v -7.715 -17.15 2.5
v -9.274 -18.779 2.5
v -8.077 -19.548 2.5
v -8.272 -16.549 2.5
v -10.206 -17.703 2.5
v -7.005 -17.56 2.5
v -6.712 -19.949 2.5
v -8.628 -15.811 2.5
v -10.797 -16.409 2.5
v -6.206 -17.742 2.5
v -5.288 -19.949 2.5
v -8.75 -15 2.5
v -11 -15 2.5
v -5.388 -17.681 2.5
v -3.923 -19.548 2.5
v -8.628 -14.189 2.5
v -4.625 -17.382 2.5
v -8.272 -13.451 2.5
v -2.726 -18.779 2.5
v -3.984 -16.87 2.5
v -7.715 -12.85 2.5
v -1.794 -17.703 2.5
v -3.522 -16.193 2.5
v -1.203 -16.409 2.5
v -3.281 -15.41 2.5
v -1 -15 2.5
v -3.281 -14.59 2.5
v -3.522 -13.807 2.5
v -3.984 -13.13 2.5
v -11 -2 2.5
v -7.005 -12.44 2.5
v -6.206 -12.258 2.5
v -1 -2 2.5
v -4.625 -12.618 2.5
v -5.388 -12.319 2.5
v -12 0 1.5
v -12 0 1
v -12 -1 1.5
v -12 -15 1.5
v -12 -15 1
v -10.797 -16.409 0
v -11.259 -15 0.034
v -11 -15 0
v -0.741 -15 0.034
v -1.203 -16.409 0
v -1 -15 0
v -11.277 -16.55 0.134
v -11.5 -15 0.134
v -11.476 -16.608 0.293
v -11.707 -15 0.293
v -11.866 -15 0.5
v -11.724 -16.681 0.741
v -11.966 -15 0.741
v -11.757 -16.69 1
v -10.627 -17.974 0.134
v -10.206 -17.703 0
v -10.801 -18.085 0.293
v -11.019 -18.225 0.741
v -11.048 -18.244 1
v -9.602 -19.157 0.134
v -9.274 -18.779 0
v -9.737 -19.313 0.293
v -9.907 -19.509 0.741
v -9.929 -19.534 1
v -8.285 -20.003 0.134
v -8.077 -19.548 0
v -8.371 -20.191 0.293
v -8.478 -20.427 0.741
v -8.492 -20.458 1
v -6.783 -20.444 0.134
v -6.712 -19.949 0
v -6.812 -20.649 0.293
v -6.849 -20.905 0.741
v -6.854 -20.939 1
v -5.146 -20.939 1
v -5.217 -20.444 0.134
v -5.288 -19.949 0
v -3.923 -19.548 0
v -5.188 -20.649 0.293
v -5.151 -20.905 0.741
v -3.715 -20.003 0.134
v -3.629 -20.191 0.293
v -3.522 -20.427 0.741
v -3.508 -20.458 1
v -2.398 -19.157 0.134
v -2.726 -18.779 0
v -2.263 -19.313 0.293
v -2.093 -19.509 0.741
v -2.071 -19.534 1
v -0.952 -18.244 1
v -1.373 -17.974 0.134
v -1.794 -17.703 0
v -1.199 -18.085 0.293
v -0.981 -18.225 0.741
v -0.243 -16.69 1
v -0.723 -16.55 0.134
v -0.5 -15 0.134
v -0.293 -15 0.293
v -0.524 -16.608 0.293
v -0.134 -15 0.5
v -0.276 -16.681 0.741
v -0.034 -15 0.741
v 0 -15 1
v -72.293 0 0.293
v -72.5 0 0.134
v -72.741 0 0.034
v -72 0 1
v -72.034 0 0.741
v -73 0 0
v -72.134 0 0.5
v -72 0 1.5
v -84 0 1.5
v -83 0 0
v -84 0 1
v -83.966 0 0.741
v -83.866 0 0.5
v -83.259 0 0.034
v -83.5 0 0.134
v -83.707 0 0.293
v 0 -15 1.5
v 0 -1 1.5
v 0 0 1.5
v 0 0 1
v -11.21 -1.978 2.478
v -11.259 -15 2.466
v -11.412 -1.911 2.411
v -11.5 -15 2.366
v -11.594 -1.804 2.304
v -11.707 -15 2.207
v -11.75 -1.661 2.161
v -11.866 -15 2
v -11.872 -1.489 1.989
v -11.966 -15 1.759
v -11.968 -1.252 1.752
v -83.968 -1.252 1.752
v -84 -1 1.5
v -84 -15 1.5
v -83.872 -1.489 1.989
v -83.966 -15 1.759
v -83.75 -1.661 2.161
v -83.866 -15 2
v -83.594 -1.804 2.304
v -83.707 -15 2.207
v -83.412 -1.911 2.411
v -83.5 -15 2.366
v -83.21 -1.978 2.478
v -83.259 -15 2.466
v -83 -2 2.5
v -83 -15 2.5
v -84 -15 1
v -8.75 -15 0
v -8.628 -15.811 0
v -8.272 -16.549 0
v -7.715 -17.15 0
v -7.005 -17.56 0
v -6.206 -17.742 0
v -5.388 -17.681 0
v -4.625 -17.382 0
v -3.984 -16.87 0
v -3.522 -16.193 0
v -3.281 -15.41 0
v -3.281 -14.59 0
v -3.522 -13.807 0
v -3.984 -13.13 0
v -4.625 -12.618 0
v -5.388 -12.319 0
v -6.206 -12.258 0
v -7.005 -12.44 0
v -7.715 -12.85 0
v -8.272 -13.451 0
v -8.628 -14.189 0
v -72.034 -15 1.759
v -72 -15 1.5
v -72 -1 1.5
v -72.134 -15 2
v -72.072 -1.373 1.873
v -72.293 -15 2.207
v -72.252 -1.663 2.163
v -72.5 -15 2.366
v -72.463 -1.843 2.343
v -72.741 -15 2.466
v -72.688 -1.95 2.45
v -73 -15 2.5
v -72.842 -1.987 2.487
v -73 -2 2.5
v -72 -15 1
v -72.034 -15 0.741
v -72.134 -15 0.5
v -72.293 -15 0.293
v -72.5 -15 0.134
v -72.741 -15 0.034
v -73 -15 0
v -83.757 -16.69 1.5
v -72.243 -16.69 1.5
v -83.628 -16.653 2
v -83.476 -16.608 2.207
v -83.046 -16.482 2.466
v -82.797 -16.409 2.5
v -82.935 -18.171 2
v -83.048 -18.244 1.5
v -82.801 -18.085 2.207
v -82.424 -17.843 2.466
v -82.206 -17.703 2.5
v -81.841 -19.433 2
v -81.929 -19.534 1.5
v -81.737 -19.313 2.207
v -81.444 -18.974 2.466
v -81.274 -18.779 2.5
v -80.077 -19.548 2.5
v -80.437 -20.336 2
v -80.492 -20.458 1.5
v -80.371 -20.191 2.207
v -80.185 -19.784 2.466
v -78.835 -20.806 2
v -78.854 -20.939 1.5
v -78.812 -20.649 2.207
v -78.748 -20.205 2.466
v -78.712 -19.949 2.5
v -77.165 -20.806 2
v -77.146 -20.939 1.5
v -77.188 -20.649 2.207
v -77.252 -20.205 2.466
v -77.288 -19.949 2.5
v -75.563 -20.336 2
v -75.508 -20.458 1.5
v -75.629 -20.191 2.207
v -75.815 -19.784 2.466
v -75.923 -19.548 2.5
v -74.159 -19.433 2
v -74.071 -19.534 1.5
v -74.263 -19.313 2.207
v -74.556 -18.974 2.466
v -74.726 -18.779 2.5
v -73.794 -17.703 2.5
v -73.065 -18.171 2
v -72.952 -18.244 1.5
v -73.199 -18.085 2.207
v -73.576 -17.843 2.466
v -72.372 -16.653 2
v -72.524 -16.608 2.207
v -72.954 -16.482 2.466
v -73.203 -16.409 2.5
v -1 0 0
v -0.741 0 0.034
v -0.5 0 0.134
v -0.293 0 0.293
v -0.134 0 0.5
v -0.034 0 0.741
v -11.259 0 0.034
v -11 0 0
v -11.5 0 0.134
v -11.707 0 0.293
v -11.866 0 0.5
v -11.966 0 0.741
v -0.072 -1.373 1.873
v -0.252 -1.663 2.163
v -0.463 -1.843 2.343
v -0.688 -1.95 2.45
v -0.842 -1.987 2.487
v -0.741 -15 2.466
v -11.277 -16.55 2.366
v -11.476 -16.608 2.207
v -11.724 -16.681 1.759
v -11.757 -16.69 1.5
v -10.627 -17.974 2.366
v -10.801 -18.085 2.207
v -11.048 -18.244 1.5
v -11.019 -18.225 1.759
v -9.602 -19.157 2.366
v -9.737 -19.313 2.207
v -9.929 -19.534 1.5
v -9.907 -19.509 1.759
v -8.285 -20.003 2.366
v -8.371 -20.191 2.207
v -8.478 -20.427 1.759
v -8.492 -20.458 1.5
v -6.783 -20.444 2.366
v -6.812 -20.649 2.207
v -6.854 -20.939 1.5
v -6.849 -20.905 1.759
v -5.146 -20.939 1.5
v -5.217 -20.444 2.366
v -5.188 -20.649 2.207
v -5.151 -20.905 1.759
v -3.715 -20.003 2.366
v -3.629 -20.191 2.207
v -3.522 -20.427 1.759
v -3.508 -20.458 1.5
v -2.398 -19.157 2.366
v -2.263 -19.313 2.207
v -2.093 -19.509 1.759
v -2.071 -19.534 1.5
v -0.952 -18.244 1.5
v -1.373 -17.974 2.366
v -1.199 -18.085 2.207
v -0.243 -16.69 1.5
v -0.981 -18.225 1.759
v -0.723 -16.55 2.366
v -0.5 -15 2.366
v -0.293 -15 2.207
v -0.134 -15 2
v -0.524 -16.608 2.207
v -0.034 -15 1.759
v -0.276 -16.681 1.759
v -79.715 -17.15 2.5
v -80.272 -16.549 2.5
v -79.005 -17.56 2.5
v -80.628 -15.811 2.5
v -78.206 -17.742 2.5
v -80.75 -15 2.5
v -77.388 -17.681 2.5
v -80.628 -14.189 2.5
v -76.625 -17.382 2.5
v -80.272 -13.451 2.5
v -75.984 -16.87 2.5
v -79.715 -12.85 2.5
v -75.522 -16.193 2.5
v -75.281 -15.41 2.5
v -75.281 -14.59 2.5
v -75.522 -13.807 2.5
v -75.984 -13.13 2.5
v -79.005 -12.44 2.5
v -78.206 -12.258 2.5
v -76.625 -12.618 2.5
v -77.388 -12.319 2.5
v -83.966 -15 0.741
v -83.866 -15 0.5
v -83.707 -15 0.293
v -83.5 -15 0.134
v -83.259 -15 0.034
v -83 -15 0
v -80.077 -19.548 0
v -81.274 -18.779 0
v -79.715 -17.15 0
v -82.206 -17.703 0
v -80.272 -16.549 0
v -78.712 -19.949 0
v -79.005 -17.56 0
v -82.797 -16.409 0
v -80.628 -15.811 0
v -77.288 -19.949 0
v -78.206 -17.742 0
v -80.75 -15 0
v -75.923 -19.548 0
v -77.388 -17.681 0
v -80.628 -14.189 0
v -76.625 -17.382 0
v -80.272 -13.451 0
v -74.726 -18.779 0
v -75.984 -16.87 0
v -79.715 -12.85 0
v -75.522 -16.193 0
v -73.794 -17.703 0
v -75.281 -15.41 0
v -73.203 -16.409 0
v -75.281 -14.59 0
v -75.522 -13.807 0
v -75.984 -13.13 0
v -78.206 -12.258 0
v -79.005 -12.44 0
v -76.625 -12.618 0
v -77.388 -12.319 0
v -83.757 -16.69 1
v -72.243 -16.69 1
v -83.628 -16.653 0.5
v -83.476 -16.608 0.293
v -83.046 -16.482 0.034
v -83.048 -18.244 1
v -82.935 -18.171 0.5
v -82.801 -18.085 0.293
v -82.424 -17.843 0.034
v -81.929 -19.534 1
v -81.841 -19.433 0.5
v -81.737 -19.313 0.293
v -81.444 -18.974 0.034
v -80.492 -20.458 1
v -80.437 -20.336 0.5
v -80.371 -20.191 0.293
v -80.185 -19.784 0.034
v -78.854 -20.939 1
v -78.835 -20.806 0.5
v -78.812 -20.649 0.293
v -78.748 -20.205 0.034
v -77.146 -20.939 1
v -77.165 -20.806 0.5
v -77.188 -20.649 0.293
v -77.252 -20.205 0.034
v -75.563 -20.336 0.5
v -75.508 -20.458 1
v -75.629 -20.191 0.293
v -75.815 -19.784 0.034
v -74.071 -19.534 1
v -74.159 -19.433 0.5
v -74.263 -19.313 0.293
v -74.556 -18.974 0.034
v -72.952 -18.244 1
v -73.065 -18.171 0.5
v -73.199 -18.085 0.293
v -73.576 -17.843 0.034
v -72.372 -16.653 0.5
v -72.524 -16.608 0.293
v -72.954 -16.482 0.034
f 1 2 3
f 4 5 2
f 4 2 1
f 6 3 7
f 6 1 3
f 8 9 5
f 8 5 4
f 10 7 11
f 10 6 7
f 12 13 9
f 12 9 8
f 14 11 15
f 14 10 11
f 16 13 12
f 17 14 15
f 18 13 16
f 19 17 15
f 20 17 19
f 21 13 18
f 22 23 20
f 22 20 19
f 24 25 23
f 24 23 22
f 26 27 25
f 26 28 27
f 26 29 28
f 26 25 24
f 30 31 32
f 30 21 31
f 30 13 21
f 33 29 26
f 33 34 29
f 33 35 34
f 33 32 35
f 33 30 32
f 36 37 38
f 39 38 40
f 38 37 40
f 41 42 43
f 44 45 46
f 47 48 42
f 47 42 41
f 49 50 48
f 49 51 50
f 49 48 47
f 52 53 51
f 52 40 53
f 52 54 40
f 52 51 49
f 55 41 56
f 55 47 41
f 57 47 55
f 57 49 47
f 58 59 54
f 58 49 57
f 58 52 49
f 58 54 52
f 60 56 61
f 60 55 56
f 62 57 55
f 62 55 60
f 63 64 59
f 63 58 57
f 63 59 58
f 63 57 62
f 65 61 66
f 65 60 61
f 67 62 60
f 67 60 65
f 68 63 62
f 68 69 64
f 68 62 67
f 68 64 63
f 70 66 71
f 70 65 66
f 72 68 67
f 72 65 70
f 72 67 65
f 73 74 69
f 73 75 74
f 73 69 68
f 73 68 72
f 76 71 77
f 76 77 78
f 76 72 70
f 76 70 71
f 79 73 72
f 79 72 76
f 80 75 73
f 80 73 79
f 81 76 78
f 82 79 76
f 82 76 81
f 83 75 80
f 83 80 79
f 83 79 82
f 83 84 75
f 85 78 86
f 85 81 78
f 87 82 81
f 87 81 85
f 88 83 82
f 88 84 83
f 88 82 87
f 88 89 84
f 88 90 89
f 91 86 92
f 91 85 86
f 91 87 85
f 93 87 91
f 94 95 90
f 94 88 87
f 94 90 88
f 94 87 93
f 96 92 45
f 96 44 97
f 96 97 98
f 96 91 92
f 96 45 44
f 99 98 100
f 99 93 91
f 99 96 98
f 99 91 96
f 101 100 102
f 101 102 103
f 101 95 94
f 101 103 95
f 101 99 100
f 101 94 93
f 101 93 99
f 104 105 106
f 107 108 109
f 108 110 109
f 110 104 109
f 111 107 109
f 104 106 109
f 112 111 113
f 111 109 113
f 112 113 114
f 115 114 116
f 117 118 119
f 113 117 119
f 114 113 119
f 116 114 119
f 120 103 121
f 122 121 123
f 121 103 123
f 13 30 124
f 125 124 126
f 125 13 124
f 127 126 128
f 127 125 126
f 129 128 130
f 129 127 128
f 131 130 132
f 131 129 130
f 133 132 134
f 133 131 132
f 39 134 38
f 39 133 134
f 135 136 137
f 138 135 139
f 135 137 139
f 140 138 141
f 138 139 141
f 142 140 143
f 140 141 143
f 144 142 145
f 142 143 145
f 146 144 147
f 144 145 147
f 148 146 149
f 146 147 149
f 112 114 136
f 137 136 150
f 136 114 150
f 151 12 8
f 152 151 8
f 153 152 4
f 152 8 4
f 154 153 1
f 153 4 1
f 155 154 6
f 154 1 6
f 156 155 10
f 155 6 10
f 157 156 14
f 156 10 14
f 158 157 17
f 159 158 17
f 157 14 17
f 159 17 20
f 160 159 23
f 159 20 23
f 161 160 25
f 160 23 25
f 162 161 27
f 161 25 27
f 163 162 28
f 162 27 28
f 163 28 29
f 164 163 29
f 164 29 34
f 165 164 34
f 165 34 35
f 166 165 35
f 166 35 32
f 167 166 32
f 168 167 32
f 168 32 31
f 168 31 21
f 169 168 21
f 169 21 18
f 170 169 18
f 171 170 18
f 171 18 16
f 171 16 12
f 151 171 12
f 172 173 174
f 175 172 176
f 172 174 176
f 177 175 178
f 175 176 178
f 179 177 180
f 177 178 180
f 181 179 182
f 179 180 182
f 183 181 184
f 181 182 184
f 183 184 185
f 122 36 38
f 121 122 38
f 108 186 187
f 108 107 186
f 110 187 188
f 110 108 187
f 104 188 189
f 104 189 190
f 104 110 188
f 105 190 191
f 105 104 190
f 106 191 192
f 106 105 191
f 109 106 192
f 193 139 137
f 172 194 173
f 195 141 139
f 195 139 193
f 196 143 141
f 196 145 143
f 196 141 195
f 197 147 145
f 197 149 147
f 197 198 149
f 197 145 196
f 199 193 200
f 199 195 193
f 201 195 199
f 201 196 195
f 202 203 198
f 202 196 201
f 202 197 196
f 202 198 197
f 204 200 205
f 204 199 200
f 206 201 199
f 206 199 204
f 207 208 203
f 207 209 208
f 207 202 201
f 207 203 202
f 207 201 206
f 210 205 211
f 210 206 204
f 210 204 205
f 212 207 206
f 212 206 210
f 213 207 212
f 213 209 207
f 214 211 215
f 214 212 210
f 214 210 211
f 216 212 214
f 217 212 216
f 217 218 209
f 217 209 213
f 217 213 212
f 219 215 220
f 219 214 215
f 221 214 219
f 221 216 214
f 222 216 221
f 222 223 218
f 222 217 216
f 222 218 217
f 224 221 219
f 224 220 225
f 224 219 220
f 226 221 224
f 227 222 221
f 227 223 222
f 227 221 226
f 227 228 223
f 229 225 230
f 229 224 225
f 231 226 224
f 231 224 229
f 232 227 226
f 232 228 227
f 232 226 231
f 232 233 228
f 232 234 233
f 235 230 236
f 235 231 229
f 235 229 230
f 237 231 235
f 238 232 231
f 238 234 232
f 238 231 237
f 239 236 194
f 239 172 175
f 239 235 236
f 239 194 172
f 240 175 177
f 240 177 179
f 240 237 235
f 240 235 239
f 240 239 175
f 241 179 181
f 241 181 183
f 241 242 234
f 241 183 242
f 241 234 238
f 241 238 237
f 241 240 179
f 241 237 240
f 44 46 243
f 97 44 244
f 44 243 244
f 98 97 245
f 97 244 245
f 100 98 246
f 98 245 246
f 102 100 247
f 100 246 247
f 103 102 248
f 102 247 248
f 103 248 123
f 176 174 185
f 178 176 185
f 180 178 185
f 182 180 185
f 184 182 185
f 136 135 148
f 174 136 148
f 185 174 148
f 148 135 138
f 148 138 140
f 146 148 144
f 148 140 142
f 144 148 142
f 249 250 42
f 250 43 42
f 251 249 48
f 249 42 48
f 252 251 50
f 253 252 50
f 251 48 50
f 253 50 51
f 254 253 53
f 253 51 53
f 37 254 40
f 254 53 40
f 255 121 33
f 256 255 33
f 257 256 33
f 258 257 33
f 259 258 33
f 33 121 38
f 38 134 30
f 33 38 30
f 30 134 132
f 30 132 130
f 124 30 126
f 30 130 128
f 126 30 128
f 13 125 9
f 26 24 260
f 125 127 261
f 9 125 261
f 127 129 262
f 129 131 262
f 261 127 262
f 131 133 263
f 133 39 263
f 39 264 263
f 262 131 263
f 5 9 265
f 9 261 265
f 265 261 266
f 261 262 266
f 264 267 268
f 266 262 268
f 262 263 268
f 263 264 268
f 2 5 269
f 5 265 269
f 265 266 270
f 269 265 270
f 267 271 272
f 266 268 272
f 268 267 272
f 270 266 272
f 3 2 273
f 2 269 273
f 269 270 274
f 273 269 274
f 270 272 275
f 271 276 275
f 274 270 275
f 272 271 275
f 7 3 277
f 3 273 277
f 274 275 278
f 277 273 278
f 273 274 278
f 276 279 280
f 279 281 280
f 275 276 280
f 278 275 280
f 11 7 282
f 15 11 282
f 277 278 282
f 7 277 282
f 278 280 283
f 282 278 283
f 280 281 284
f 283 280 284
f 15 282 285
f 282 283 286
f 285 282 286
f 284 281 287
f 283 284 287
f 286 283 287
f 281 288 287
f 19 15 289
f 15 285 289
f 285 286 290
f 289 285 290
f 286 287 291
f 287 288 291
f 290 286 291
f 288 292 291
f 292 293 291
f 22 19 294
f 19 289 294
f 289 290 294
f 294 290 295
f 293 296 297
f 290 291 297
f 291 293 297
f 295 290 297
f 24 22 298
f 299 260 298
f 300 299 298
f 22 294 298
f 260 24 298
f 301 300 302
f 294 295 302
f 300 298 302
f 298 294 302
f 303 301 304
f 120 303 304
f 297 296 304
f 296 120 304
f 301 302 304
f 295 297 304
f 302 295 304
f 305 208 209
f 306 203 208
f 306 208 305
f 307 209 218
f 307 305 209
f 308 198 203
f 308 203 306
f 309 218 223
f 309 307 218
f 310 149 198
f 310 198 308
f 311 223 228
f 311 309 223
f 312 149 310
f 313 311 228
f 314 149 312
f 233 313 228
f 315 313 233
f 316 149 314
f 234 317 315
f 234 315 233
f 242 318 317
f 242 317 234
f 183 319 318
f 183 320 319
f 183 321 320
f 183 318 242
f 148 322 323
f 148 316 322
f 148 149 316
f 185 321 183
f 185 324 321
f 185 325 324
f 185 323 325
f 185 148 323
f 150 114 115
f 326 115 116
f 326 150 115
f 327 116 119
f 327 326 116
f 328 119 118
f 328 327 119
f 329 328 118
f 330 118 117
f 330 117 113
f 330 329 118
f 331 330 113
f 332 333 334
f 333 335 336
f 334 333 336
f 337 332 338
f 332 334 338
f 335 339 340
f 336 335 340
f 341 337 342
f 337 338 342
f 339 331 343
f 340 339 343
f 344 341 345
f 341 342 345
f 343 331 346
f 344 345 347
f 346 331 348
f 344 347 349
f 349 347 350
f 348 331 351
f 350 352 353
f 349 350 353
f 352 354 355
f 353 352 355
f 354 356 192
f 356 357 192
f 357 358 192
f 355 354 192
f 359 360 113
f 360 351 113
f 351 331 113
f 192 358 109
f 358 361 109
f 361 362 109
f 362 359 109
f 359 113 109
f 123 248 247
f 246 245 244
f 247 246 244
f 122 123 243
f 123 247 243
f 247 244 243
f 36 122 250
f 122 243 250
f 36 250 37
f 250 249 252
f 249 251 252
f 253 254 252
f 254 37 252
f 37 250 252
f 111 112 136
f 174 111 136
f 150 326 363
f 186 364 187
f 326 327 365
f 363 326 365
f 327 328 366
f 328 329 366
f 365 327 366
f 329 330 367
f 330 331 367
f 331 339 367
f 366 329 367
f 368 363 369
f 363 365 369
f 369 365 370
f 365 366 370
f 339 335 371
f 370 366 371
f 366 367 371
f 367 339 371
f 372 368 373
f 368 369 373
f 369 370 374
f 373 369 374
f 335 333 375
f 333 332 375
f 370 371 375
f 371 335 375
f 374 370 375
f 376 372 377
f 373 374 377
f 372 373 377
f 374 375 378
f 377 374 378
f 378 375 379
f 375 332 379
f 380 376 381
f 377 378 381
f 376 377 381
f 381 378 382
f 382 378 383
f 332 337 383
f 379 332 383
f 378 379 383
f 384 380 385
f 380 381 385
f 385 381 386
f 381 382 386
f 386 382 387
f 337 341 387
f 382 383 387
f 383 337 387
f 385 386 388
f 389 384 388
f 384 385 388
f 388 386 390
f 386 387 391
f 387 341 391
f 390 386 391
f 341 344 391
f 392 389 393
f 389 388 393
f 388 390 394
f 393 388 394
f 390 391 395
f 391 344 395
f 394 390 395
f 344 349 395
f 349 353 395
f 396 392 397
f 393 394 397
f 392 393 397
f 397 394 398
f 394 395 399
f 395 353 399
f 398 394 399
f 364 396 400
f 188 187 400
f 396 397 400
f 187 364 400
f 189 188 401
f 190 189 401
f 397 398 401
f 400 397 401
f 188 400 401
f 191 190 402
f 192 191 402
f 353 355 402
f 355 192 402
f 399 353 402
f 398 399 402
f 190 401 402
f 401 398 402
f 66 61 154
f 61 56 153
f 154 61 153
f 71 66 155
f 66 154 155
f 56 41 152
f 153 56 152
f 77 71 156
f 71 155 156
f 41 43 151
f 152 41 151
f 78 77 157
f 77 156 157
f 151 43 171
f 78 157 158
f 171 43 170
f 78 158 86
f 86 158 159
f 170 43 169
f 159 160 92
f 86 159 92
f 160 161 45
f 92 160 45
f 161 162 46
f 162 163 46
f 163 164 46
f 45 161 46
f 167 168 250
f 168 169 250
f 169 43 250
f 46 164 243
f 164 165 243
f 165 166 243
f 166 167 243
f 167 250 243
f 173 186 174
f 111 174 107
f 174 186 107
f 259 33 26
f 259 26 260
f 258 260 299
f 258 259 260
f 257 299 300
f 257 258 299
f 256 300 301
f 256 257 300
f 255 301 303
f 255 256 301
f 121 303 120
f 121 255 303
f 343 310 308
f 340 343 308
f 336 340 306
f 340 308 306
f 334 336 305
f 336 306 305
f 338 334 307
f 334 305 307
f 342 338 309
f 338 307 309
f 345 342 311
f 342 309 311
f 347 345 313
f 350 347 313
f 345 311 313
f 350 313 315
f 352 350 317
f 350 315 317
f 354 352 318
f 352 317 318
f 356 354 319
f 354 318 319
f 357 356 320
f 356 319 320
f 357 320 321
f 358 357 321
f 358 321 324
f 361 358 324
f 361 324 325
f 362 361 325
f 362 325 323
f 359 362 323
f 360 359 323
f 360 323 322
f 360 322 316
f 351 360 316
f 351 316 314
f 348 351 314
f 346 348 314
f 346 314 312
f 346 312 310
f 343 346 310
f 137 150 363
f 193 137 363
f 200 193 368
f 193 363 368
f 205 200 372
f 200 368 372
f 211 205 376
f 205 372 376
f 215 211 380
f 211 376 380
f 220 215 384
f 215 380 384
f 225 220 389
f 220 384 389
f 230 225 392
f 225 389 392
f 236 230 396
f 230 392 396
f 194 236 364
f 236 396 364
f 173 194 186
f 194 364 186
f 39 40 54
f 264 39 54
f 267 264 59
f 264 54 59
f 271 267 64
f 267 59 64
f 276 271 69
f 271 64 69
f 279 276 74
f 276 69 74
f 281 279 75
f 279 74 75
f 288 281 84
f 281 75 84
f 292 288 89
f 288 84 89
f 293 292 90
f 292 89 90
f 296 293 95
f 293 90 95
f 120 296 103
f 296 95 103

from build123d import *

# Parameters (mm, degrees)
F1_DEPTH = 2.5
F2_D     = 5.5
F2_2_D   = 5.5
F3_R     = 1
F3_2_R   = 1
F5_DEPTH = 84.0010001


with BuildPart() as f1:
    # F0 (on Top) → F1 (new body)
    with BuildSketch(Plane.XY):
        with BuildLine():
            ThreePointArc((-84, -15), (-78, -21), (-72, -15))
            ThreePointArc((-72, -15), (-78, -9), (-84, -15))
        make_face()
        with BuildLine():
            Line((-72, -15), (-72, 0))
            Line((-72, 0), (-84, 0))
            Line((-84, 0), (-84, -15))
            ThreePointArc((-84, -15), (-78, -9), (-72, -15))
        make_face()
    extrude(amount=F1_DEPTH)

    # F2 (through all)
    with Locations(Plane(origin=(0, 0, 0), x_dir=(1, 0, 0), z_dir=(0, 0, -1))):
        with Locations((-78, 15), (-6, 15)):
            Hole(F2_D / 2)

    # F3
    f3_edges = [f1.edges().sort_by_distance(p)[0] for p in [
        (-84, -7.5, 2.5),
        (-84, -7.5, 0),
    ]]
    fillet(f3_edges, radius=F3_R)


with BuildPart() as f1b:
    # F0 (on Top) → F1, piece 2 (new body)
    with BuildSketch(Plane.XY):
        with BuildLine():
            Line((0, -15), (0, 0))
            Line((0, 0), (-12, 0))
            Line((-12, 0), (-12, -15))
            ThreePointArc((-12, -15), (-6, -9), (0, -15))
        make_face()
        with BuildLine():
            ThreePointArc((-12, -15), (-6, -21), (0, -15))
            ThreePointArc((0, -15), (-6, -9), (-12, -15))
        make_face()
    extrude(amount=F1_DEPTH)

    # F2#2 (through all)
    with Locations(Plane(origin=(0, 0, 0), x_dir=(1, 0, 0), z_dir=(0, 0, -1))):
        with Locations((-78, 15), (-6, 15)):
            Hole(F2_2_D / 2)

    # F3#2
    f3_2_edges = [f1b.edges().sort_by_distance(p)[0] for p in [
        (-12, -7.5, 2.5),
        (-12, -7.5, 0),
    ]]
    fillet(f3_2_edges, radius=F3_2_R)


with BuildPart() as f5_tool:
    # F4 (on face) → F5 (new body, through all)
    with BuildSketch(Plane(origin=(-84, 0, 0), x_dir=(0, -1, 0), z_dir=(-1, 0, 0))):
        Polygon((0, 2.5), (0, 1.5), (1, 1.5), (2, 2.5), align=None)
    extrude(amount=-F5_DEPTH)


with BuildPart() as f1_1:
    add(f1.part)

    # F5: cut by f5_tool
    add(f5_tool.part, mode=Mode.SUBTRACT)


with BuildPart() as f1b_1:
    add(f1b.part)

    # F5: cut by f5_tool
    add(f5_tool.part, mode=Mode.SUBTRACT)


solid = Compound([f1_1.part, f1b_1.part])
